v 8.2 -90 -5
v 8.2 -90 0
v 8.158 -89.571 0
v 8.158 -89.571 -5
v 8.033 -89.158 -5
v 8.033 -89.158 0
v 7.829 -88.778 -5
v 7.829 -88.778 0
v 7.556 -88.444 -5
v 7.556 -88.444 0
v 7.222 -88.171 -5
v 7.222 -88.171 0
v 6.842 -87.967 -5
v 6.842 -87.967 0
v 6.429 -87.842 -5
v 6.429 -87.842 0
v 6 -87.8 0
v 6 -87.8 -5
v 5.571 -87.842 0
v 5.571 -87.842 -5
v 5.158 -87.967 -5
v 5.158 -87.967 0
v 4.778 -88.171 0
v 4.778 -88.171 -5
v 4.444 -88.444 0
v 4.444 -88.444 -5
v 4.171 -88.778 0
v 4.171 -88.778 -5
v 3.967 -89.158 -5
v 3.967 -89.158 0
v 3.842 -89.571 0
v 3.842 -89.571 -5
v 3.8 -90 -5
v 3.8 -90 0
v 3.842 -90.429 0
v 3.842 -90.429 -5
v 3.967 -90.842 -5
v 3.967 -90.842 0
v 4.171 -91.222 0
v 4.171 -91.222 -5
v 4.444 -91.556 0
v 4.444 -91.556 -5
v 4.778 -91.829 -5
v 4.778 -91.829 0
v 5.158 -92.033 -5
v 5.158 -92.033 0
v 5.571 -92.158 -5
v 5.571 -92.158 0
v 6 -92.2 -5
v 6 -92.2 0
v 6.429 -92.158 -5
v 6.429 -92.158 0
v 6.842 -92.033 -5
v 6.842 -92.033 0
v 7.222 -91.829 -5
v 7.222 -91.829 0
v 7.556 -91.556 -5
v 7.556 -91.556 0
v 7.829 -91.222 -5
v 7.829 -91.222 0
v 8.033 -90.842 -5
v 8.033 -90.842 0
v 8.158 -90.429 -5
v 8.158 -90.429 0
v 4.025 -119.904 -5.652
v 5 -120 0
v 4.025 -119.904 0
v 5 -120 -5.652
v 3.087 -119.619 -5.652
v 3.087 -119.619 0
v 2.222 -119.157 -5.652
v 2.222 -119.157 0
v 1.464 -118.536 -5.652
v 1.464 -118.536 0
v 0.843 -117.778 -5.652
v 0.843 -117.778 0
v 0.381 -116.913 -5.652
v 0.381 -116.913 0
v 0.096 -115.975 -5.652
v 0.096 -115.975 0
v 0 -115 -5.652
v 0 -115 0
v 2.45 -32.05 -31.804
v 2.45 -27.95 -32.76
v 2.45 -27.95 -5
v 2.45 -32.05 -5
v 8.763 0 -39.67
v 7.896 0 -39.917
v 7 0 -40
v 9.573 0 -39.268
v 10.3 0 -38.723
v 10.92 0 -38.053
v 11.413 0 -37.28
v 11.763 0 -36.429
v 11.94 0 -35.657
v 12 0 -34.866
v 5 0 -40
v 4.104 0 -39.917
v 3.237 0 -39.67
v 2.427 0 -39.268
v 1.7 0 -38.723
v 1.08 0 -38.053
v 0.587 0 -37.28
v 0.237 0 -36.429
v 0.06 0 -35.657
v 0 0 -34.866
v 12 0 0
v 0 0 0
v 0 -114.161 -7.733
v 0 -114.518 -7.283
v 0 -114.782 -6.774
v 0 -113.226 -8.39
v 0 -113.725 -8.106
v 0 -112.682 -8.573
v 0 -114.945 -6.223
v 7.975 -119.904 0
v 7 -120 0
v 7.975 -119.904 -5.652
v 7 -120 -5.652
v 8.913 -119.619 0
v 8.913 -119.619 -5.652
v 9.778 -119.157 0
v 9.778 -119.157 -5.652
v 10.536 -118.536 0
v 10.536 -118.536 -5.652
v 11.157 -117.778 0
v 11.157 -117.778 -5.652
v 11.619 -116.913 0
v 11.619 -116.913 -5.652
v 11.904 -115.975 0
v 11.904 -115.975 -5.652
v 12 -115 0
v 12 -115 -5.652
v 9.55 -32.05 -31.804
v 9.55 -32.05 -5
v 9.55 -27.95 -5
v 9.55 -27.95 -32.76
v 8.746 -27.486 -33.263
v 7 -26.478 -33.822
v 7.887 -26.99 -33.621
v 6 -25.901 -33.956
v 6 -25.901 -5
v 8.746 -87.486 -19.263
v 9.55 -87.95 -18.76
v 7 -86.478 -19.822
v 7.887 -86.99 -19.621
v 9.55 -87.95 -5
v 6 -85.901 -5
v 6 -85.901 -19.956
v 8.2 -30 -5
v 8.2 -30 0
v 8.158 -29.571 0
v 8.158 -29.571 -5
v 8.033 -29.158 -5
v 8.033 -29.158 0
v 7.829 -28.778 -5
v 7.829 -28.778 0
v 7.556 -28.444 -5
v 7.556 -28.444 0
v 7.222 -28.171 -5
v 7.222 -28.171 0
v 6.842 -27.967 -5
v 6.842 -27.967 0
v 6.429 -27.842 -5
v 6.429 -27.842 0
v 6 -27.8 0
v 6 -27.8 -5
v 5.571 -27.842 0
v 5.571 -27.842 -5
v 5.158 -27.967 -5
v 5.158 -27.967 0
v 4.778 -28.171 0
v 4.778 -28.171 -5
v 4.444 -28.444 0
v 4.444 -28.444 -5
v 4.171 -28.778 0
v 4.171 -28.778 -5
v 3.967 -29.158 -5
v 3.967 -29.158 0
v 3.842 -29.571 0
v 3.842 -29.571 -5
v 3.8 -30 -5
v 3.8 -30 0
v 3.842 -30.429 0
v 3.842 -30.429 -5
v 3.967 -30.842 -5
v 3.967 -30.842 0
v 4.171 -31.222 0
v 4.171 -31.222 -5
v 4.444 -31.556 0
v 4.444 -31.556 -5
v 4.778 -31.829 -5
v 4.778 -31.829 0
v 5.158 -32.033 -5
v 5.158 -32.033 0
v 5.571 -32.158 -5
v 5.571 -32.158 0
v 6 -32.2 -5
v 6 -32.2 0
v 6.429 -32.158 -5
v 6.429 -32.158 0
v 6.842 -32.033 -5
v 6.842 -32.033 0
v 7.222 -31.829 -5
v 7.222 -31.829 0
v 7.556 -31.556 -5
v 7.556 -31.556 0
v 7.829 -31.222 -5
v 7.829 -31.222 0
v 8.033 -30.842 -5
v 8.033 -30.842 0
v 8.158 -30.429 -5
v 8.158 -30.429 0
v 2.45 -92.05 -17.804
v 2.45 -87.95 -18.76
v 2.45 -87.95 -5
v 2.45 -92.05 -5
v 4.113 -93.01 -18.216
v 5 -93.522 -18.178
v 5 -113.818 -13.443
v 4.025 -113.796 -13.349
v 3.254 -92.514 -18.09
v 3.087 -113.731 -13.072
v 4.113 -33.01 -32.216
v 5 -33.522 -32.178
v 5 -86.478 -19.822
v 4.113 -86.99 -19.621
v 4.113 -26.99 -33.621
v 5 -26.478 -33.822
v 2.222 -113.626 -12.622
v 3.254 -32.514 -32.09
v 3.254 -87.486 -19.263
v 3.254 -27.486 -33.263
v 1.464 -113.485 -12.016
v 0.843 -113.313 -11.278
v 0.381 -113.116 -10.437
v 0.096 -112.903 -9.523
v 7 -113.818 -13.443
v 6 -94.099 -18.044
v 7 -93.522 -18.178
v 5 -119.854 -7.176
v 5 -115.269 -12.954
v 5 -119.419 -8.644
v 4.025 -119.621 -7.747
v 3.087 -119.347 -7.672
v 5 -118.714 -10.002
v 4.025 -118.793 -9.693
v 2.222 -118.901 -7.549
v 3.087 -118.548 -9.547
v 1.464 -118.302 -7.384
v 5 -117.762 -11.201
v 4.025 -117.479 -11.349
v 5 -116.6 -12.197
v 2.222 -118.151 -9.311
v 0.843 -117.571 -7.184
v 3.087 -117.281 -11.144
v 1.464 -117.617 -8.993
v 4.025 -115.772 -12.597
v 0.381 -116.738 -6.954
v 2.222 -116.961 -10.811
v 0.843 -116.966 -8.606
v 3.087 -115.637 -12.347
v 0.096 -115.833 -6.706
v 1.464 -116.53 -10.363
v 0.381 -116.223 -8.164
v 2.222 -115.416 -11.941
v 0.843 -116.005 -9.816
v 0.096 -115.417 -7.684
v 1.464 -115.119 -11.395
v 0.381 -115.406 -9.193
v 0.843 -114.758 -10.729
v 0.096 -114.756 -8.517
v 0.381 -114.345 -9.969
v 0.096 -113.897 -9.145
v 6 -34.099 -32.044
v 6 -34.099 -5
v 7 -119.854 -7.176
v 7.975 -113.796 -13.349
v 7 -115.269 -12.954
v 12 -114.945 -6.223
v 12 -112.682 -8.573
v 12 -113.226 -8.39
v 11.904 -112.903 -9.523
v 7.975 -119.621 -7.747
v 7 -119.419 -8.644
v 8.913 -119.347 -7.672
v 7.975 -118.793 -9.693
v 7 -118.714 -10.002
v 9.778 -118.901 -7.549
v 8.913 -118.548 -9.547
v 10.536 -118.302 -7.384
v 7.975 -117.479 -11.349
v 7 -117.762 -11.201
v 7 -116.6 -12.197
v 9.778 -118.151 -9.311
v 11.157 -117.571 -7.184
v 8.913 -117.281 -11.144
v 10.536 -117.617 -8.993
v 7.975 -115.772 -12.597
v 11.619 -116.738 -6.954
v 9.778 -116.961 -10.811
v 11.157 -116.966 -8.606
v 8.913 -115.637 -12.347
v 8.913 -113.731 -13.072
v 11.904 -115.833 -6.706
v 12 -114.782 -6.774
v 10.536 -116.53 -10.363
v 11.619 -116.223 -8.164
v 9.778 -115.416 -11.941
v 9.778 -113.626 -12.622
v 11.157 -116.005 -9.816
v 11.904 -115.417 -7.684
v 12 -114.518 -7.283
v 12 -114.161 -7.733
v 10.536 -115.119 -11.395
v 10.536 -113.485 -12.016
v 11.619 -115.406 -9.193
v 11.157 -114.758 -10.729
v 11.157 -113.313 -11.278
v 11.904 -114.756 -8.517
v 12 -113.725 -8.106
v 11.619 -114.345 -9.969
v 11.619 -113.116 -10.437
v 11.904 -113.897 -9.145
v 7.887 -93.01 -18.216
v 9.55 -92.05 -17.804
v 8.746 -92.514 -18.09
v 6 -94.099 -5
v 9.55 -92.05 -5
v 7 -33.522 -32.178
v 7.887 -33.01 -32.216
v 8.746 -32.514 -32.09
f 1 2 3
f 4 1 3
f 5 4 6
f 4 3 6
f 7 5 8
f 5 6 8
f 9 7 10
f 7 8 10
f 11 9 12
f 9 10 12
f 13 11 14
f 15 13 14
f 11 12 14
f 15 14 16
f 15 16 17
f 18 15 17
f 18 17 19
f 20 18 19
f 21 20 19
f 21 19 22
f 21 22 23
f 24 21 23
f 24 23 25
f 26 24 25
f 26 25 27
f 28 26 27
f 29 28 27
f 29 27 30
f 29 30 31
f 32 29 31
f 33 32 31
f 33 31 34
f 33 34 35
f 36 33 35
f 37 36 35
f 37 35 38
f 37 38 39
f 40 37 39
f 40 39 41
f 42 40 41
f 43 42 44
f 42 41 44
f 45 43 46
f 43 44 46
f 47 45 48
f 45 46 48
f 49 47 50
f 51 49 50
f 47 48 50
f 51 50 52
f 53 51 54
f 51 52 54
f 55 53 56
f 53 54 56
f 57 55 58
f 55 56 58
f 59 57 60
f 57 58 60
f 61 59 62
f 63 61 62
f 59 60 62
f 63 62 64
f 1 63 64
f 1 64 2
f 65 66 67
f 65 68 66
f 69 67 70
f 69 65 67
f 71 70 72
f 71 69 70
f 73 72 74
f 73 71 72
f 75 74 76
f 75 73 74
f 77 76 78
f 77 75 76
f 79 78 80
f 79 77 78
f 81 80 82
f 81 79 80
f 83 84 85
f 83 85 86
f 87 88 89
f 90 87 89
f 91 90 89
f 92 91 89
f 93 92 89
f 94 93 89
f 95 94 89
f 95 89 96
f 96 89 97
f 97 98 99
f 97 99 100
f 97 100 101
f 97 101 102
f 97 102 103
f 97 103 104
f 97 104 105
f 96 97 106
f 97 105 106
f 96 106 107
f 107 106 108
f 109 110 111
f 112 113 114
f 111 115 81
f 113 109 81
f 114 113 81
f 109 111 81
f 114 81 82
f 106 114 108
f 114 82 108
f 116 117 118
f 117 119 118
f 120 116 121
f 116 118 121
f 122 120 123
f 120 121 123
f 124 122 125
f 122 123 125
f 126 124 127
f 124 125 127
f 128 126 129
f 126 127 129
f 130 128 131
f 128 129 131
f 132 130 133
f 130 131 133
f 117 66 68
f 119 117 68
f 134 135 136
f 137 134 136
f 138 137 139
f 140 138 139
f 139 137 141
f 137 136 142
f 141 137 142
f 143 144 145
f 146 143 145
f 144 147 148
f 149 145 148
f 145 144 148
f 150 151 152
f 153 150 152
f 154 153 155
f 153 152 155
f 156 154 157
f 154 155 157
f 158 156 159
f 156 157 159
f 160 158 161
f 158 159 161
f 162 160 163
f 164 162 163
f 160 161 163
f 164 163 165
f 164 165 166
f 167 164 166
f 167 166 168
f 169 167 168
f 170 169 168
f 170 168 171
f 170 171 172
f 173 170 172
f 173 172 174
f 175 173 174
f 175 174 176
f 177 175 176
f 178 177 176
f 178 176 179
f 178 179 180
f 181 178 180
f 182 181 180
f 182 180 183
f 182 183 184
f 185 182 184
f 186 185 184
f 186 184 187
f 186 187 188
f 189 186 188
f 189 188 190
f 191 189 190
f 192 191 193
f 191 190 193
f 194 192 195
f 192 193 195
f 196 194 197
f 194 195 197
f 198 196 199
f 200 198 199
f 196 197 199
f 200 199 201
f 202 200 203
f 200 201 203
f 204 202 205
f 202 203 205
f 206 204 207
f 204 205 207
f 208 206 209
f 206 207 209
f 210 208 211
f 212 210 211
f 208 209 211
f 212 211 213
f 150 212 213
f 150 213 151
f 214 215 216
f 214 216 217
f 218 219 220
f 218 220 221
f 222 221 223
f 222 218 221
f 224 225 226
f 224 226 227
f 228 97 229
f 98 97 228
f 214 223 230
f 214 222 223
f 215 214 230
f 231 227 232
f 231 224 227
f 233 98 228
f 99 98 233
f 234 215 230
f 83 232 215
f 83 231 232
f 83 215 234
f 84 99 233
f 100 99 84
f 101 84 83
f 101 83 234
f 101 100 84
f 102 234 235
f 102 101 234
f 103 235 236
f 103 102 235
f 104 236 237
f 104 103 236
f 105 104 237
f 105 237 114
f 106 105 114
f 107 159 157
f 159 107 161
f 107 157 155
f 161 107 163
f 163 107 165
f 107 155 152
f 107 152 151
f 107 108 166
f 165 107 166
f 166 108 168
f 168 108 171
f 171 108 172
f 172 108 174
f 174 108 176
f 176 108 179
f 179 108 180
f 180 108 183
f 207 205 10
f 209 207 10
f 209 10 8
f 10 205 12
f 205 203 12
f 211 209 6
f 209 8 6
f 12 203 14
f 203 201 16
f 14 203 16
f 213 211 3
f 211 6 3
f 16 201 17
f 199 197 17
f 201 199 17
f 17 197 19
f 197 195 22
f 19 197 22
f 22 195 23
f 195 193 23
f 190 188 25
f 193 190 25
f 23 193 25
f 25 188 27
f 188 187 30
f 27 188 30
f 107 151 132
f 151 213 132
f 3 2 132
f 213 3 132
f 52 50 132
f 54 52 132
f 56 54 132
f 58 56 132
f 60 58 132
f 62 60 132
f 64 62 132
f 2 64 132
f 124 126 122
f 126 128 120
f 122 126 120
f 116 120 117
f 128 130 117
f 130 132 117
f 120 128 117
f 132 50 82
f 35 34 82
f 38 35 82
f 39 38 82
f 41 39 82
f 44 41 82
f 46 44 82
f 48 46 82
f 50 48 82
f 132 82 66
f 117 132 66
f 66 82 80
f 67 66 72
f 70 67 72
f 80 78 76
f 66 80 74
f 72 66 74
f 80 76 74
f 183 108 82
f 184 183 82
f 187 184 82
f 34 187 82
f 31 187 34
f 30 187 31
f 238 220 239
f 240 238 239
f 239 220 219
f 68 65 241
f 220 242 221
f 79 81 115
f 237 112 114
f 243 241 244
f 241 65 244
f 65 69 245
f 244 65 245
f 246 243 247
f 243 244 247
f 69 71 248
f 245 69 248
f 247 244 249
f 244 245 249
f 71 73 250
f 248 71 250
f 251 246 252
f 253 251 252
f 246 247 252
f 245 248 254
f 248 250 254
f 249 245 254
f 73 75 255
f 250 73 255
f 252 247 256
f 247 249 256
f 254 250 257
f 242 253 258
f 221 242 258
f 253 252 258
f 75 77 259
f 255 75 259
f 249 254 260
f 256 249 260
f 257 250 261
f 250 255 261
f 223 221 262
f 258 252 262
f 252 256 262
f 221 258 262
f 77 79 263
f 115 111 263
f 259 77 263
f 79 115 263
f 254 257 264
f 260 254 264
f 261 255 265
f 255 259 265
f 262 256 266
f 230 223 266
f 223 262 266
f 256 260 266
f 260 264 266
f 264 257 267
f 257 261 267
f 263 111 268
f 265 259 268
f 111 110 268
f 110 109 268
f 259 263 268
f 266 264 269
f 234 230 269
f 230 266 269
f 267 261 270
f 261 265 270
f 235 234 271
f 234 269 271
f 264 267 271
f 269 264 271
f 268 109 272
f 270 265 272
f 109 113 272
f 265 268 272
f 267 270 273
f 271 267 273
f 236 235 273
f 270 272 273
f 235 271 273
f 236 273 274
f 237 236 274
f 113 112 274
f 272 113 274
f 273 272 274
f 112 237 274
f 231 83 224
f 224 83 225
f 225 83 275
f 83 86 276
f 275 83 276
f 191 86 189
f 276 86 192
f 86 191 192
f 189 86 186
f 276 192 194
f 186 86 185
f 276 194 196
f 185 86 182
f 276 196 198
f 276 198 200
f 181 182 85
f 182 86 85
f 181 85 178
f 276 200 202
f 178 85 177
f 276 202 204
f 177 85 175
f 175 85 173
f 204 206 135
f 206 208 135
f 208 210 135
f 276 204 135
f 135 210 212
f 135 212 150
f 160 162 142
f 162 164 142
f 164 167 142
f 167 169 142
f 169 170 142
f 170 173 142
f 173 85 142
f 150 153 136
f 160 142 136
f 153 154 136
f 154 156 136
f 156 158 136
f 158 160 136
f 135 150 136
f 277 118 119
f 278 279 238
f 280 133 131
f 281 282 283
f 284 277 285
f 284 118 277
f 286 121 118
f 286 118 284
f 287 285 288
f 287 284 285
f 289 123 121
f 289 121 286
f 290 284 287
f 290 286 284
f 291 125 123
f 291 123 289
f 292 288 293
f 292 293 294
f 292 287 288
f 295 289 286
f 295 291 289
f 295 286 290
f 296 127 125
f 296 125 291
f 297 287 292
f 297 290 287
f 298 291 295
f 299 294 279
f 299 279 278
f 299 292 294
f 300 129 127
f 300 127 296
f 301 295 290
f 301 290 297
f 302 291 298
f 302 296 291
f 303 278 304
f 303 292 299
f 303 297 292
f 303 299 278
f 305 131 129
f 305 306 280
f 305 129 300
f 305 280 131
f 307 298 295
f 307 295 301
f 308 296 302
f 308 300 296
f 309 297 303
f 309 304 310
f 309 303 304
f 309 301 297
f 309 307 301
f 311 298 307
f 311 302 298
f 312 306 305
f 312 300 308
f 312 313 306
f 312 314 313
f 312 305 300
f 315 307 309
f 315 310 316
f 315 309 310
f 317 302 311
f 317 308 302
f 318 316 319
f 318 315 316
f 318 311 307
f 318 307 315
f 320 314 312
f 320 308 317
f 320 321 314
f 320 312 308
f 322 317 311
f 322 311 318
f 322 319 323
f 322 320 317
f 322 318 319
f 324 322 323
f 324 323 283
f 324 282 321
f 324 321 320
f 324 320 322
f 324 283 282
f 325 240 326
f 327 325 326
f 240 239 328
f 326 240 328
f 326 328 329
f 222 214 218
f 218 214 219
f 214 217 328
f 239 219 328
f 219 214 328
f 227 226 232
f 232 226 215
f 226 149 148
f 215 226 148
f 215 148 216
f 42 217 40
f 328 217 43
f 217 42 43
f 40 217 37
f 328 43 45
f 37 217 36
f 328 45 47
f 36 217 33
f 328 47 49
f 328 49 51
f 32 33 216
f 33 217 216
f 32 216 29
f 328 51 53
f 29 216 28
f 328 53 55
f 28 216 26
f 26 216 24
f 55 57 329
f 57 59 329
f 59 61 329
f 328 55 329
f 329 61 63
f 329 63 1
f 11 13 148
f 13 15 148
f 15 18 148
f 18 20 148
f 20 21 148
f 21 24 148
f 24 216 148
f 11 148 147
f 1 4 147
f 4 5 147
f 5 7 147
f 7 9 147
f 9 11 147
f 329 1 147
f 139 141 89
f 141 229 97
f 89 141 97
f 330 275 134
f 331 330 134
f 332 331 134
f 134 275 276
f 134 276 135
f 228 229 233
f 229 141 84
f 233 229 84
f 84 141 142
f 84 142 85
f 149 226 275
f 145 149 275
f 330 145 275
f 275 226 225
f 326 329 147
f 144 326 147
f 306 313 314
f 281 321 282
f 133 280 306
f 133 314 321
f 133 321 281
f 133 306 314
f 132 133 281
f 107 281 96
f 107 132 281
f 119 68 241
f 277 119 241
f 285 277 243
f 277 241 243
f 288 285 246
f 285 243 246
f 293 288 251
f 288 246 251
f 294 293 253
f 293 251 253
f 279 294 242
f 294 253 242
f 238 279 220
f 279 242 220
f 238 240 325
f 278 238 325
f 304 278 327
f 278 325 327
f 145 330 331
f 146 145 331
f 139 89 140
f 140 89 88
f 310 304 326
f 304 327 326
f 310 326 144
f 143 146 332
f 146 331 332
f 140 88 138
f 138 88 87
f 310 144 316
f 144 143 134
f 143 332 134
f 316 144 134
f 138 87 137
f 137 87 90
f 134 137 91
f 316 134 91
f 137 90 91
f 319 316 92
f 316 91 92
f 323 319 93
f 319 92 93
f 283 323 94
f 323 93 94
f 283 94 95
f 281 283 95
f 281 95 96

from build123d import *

# Parameters (mm, degrees)
F1_DEPTH = 12
F2_R     = 5
F3_R     = 2.2
F4_DEPTH = 40.001
F6_START = -5
F6_DEPTH = 35.0010001


with BuildPart() as f1:
    # F0 (on Right) → F1 (new body)
    with BuildSketch(Plane.YZ):
        with BuildLine():
            Line((0, -40), (0, 0))
            Line((0, 0), (-120, 0))
            Line((-120, 0), (-120, -5.6517750396))
            ThreePointArc((-120, -5.6517750396), (-118.2666855434, -10.6245662378), (-113.8178369249, -13.4425047175))
            Line((-113.8178369249, -13.4425047175), (0, -40))
        make_face()
    extrude(amount=F1_DEPTH)

    # F2
    f2_edges = [f1.edges().sort_by_distance(p)[0] for p in [
        (0, -56.908918, -26.721252),
        (12, -56.908918, -26.721252),
    ]]
    fillet(f2_edges, radius=F2_R)

    # F3 (on face) → F4 (cut, through all)
    with BuildSketch(Plane.XY):
        with Locations((6, -30)):
            Circle(F3_R)
        with Locations((6, -90)):
            Circle(F3_R)
    extrude(amount=-F4_DEPTH, mode=Mode.SUBTRACT)

    # F5 (on face) → F6 (cut)
    with BuildSketch(Plane.XY.offset(F6_START)):
        Polygon((2.45, -32.0495934556), (6, -34.0991869112), (9.55, -32.0495934556), (9.55, -27.9504065444), (6, -25.9008130888), (2.45, -27.9504065444), align=None)
        Polygon((2.45, -92.0495934556), (6, -94.0991869112), (9.55, -92.0495934556), (9.55, -87.9504065444), (6, -85.9008130888), (2.45, -87.9504065444), align=None)
    extrude(amount=-F6_DEPTH, mode=Mode.SUBTRACT)


solid = f1.part
